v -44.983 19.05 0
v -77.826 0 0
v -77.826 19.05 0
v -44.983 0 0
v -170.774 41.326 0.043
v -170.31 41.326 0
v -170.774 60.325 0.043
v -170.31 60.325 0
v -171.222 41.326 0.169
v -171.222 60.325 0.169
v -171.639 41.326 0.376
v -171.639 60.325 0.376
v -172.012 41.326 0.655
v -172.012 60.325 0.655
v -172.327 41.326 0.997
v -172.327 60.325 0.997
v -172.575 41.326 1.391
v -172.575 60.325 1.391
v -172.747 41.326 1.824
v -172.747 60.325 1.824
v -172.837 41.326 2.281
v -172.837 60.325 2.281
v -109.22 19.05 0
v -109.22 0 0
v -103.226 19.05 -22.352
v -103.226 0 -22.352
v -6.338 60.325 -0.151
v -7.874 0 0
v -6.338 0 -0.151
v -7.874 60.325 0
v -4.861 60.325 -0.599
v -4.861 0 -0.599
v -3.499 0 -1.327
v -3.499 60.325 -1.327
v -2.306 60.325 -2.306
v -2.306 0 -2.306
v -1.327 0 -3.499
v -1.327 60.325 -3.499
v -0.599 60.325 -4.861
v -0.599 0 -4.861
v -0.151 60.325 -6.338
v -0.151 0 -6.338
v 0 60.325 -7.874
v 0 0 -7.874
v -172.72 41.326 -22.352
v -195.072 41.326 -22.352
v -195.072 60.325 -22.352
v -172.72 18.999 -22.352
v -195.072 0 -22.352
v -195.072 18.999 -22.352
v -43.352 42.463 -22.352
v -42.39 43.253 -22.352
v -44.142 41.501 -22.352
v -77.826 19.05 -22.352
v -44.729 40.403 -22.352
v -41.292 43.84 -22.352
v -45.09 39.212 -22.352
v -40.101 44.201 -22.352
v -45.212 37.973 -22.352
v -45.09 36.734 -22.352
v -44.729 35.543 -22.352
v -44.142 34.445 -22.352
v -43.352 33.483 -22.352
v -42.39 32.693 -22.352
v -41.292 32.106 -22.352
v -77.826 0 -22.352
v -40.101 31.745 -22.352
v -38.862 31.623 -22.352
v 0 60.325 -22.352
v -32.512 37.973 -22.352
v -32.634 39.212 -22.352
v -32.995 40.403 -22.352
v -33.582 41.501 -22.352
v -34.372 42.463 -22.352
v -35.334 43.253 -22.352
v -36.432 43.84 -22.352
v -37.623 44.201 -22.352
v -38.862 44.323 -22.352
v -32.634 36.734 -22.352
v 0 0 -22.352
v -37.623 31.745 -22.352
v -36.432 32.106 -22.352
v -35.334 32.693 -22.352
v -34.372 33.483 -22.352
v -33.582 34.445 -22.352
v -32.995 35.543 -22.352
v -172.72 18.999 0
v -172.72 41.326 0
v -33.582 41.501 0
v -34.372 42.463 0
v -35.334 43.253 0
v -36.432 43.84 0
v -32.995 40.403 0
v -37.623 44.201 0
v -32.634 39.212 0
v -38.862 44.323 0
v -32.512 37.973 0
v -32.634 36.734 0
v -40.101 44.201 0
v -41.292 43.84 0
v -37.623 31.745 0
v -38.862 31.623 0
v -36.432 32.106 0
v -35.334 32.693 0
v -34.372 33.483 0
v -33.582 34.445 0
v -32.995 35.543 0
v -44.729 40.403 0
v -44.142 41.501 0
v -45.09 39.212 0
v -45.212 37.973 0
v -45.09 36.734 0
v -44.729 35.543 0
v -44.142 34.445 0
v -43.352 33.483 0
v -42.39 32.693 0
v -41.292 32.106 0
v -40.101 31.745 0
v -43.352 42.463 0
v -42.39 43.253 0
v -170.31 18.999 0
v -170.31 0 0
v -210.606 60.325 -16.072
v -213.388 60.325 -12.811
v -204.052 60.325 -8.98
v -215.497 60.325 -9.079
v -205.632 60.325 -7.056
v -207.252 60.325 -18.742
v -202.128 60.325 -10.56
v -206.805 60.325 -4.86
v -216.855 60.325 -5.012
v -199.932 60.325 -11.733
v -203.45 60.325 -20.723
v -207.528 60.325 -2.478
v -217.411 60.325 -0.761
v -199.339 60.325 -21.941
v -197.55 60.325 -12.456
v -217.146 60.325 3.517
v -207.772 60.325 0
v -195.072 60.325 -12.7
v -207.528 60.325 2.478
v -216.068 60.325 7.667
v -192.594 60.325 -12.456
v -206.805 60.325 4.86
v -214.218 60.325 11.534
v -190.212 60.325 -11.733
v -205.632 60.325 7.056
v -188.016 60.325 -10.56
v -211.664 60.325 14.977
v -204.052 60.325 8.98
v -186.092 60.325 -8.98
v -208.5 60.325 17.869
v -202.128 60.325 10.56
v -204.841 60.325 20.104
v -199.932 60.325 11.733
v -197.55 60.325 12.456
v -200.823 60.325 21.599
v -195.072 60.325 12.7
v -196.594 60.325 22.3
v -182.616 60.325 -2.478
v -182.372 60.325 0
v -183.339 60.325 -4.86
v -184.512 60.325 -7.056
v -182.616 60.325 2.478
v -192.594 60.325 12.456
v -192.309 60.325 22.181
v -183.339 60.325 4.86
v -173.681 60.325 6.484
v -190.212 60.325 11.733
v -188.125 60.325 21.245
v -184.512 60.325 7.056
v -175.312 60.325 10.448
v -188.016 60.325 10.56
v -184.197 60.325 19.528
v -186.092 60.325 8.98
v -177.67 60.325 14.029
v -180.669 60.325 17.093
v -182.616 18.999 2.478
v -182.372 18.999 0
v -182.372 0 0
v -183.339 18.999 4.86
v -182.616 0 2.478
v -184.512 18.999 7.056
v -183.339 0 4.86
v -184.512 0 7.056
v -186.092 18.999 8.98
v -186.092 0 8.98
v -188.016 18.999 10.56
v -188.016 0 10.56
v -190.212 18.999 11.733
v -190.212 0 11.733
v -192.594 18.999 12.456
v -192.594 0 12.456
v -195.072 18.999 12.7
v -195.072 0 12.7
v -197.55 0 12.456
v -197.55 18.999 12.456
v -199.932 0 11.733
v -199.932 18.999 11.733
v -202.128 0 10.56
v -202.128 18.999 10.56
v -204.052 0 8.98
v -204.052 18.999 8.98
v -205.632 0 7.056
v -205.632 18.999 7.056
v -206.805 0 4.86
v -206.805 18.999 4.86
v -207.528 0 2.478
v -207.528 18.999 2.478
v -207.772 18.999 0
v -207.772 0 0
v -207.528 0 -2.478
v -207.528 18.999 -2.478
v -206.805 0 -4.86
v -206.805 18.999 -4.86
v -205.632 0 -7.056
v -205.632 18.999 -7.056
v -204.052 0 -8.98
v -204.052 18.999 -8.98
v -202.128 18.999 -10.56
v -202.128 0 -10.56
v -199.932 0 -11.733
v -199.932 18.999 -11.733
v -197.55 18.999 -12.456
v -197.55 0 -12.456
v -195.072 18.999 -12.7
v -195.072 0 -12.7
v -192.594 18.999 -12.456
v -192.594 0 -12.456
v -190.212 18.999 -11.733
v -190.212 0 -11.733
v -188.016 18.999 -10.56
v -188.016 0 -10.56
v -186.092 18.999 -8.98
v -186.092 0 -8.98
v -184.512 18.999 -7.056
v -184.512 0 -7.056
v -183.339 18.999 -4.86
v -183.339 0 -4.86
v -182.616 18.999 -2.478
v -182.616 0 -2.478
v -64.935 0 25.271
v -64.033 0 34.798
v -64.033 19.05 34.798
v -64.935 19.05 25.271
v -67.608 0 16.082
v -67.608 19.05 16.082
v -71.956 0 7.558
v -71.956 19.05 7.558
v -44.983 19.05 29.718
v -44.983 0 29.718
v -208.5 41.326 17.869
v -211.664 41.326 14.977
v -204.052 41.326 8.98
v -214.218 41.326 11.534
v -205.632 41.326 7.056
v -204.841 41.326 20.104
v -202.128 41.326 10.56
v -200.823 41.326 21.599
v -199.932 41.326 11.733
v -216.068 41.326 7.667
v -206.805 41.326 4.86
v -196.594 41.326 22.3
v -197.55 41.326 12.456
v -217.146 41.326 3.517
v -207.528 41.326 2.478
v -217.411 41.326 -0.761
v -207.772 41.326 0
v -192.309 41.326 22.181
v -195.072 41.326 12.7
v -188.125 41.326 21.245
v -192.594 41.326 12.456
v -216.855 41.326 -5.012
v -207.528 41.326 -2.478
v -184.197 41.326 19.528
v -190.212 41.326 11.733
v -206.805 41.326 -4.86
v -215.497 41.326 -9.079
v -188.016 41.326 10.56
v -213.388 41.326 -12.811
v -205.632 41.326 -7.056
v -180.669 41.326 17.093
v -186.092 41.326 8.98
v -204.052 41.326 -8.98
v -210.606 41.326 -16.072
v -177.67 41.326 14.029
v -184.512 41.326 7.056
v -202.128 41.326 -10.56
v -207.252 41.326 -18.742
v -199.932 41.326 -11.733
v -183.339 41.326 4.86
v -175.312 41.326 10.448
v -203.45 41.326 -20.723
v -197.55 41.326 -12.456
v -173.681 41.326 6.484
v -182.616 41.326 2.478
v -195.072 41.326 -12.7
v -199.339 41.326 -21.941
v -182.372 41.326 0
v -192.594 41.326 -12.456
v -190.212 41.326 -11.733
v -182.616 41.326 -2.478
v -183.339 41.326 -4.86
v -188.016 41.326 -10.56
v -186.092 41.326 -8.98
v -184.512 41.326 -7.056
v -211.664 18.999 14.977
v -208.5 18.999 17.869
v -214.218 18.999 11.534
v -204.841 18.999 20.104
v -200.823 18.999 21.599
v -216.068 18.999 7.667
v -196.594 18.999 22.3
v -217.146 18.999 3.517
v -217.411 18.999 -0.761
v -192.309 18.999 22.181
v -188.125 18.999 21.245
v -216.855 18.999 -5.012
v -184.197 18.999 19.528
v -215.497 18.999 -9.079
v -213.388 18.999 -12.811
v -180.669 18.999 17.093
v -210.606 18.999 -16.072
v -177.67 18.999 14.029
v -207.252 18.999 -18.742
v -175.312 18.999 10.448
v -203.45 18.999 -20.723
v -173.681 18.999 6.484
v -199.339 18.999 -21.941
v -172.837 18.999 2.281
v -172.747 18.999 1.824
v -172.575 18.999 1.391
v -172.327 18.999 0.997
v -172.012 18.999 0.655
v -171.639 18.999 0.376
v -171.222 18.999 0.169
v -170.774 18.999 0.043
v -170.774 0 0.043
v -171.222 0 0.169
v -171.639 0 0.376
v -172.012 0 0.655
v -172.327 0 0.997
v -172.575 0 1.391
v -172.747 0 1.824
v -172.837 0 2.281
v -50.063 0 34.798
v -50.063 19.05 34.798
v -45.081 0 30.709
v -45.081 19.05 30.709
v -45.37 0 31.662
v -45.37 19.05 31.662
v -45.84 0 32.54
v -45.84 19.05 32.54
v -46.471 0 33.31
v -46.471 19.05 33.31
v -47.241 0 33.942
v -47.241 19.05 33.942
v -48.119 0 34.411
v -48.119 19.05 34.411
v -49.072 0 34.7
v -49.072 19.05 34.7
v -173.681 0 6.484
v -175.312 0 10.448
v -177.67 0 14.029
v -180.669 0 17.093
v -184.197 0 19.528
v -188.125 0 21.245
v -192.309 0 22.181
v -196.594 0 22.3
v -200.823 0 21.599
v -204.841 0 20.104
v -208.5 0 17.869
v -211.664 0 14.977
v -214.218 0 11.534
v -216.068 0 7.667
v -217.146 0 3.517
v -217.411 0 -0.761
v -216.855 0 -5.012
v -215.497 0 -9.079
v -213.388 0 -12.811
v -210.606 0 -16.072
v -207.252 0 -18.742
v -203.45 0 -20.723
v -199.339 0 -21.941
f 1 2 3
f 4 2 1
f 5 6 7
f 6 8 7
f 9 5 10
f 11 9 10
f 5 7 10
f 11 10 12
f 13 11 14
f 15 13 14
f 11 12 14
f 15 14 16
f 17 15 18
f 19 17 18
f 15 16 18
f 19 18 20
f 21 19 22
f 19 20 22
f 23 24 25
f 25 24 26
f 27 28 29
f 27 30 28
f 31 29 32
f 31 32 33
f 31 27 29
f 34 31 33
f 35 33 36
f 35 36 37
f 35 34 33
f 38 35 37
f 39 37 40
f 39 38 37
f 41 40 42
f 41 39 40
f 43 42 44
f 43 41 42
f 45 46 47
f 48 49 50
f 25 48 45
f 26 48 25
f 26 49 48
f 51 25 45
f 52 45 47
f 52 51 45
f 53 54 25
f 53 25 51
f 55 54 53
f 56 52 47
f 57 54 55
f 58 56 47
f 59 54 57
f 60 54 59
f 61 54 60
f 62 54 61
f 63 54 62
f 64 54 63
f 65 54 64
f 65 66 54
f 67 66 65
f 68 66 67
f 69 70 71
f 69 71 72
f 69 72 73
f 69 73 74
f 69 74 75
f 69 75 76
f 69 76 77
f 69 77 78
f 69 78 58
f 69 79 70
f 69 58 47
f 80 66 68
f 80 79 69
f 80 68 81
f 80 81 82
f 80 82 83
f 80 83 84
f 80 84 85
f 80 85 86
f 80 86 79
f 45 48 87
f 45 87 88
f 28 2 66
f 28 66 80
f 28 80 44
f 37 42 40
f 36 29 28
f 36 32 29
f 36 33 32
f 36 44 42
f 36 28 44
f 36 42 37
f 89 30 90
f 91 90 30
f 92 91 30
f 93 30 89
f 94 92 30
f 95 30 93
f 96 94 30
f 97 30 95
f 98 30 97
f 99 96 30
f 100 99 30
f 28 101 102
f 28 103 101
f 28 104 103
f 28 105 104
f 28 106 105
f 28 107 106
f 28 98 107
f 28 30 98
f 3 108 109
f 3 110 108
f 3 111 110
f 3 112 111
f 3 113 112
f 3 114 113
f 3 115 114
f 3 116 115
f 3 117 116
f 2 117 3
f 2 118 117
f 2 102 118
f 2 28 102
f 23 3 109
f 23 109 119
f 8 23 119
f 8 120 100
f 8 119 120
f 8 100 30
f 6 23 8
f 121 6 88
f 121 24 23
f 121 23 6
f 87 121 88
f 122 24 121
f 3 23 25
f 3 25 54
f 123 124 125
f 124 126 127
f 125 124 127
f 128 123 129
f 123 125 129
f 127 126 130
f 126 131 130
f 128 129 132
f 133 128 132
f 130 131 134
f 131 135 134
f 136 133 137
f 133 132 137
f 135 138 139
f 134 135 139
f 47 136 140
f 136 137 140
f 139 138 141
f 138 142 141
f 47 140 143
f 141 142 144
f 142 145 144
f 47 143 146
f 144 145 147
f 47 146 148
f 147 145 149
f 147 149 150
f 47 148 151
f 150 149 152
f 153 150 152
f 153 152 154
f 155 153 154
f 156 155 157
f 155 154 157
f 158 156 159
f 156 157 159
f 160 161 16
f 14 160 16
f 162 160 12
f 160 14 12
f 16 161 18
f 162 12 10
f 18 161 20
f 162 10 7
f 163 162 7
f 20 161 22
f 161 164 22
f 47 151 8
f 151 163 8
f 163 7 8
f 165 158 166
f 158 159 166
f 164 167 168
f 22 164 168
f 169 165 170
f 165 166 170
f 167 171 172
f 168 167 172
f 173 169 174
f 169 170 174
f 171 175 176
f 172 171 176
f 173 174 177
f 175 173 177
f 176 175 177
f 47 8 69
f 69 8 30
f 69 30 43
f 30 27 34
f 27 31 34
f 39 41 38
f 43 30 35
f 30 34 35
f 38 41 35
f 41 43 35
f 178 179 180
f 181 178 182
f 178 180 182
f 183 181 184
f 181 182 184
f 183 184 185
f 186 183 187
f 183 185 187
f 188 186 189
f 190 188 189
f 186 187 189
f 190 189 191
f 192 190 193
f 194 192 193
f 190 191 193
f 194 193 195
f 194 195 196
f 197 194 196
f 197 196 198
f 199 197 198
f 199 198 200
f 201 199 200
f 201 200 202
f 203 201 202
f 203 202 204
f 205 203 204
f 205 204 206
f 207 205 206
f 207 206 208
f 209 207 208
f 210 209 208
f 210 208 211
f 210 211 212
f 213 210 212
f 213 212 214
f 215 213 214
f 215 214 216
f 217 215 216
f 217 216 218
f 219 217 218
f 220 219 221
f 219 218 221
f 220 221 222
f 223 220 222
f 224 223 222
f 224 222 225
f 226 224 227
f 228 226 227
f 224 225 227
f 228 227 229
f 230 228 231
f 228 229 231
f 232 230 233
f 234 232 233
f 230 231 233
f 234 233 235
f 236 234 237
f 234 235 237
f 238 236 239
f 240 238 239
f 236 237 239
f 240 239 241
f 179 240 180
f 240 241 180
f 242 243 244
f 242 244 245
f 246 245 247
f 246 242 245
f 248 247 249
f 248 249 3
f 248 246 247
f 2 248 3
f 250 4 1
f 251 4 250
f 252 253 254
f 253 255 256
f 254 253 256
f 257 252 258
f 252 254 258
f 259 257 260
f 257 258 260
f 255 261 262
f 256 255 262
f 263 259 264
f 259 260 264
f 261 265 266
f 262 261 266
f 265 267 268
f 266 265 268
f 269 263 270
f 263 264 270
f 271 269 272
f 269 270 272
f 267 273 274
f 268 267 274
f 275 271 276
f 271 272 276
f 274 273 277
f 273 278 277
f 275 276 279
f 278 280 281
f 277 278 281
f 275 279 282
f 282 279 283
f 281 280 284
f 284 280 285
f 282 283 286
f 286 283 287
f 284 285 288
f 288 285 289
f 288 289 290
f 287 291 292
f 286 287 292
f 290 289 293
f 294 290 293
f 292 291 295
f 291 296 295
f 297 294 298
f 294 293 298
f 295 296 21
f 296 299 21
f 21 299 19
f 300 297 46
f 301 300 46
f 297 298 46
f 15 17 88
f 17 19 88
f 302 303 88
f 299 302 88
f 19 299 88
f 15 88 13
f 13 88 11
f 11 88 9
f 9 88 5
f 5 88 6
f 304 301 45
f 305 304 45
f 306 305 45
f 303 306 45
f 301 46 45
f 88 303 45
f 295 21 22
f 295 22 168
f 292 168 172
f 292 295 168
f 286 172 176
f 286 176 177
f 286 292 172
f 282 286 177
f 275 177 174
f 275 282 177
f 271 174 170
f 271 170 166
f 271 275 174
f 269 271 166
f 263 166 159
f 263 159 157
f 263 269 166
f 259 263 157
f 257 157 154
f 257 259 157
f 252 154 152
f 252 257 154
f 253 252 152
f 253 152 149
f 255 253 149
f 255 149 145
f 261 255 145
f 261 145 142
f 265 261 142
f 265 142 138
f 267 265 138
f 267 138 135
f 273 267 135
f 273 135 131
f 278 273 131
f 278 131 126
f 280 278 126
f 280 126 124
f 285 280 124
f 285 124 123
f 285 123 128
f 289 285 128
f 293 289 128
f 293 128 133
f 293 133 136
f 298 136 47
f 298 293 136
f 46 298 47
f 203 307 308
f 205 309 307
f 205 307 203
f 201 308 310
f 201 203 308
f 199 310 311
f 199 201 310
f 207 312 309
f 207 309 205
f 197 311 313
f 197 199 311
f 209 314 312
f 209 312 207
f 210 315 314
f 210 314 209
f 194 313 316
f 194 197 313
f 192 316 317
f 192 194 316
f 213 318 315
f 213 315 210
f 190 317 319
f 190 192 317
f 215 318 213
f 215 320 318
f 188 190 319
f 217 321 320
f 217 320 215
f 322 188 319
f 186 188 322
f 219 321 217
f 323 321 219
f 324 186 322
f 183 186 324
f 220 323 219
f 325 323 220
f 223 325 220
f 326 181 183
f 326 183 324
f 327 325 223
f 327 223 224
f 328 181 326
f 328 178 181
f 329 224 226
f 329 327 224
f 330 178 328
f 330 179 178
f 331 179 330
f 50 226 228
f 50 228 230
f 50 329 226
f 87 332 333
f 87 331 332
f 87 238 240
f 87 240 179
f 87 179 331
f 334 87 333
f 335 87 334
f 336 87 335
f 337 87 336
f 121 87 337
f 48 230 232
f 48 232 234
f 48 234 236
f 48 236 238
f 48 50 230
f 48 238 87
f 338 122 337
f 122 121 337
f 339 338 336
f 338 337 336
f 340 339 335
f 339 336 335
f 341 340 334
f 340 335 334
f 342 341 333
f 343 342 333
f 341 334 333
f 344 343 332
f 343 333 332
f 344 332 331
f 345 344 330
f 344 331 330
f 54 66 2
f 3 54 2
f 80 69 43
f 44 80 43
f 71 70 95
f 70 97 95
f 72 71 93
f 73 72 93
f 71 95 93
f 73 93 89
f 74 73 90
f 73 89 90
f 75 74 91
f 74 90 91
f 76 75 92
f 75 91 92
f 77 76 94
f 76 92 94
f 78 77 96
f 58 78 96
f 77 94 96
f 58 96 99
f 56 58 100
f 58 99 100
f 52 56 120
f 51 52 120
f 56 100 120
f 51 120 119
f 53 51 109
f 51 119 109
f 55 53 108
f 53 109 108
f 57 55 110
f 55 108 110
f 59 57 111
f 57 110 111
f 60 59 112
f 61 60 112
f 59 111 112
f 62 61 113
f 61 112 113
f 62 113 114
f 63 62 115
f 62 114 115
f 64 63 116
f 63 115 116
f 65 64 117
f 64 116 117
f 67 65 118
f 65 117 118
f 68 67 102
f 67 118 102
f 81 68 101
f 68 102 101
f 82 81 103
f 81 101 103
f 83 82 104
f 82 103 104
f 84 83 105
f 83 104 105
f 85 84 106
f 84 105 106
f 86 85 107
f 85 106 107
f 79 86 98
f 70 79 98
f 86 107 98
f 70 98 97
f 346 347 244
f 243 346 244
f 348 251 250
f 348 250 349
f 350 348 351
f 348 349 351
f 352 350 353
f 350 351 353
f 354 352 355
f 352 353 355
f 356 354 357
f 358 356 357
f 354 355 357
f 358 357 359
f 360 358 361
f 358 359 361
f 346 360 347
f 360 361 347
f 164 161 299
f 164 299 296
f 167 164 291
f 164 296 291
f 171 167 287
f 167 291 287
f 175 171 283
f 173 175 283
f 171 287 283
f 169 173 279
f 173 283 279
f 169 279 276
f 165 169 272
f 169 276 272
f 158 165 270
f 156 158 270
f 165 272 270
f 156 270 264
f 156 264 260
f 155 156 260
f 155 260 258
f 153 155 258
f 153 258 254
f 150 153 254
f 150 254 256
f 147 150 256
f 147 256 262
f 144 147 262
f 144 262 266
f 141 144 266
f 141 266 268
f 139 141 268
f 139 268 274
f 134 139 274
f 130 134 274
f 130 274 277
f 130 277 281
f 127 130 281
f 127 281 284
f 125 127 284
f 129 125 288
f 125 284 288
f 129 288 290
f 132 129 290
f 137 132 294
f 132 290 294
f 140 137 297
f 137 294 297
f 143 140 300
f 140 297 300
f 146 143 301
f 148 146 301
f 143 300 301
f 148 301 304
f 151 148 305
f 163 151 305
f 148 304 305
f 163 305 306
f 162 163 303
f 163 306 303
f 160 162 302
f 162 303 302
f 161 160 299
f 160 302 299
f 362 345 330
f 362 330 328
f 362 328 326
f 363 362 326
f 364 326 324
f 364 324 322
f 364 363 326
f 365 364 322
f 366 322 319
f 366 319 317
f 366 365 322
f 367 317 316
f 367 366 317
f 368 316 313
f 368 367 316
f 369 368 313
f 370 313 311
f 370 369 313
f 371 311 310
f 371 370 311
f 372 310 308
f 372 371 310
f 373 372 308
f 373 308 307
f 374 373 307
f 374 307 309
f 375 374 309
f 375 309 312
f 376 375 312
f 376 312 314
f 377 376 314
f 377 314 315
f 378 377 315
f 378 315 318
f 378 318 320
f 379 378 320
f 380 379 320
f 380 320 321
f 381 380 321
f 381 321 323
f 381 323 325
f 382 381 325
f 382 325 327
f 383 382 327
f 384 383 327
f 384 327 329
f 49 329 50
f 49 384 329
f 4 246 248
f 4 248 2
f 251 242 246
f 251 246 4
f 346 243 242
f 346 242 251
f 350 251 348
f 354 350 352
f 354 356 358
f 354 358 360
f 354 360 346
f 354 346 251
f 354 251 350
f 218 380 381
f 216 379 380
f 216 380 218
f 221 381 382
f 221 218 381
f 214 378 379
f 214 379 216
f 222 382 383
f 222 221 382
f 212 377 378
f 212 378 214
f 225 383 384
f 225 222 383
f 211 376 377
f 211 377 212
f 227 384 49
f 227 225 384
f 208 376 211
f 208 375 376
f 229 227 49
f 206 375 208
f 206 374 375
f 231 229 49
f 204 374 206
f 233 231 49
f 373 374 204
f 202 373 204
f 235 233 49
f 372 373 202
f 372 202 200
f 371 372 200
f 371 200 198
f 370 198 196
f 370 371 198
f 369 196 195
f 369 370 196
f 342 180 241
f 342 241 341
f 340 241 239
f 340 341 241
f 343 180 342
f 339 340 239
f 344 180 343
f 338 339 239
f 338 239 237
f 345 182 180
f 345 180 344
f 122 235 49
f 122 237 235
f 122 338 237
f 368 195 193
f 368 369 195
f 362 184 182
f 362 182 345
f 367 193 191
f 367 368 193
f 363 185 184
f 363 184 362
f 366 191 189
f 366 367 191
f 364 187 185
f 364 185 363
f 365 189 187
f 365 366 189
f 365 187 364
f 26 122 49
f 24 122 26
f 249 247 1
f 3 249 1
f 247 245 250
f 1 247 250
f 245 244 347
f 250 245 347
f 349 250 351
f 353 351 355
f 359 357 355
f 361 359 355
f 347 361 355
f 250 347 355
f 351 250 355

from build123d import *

# Parameters (mm, degrees)
F0_R     = 12.7
F1_DEPTH = 60.325
F2_DEPTH = 19.05
F4_DEPTH = 19.05
F5_W     = 85.049899257
F5_H     = 22.3266
F5_R     = 6.35
F6_DEPTH = 29.464
F7_R     = 7.874
F8_R     = 5.08
F9_R     = 2.54


with BuildPart() as f1:
    # F0 (on Front) → F1 (new body)
    with BuildSketch(Plane.XZ):
        with BuildLine():
            Line((-77.8256, 0), (-172.72, 0))
            ThreePointArc((-172.72, 0), (-210.8772507731, 15.8052507731), (-195.072, -22.352))
            Line((-195.072, -22.352), (0, -22.352))
            Line((0, -22.352), (0, 0))
            Line((0, 0), (-44.9834, 0))
            Line((-44.9834, 0), (-77.8256, 0))
        make_face()
        with Locations((-195.072, 0)):
            Circle(F0_R, mode=Mode.SUBTRACT)
    extrude(amount=-F1_DEPTH)

    # F3 (on face) → F4 (cut)
    with BuildSketch(Plane.XZ):
        Polygon((-77.8256, -22.352), (-77.8256, 0), (-109.22, 0), (-103.2256, -22.352), align=None)
    extrude(amount=-F4_DEPTH, mode=Mode.SUBTRACT)

    # F5 (on face) → F6 (cut, symmetric)
    with BuildSketch(Plane.XY):
        with Locations((-215.2449496285, 30.1625)):
            Rectangle(F5_W, F5_H)
        with Locations((-38.862, 37.973)):
            Circle(F5_R)
    extrude(amount=F6_DEPTH, both=True, mode=Mode.SUBTRACT)

    # F7
    f7_edges = [f1.edges().sort_by_distance(p)[0] for p in [
        (0, 30.1625, 0),
    ]]
    fillet(f7_edges, radius=F7_R)

    # F9
    f9_edges = [f1.edges().sort_by_distance(p)[0] for p in [
        (-172.72, 50.8254, 0),
        (-172.72, 9.4996, 0),
    ]]
    fillet(f9_edges, radius=F9_R)


with BuildPart() as f2:
    # F0 (on Front) → F2 (new body)
    with BuildSketch(Plane.XZ):
        with BuildLine():
            ThreePointArc((-64.0334, 34.798), (-67.6075846384, 16.0823576341), (-77.8256, 0))
            Line((-77.8256, 0), (-44.9834, 0))
            Line((-44.9834, 0), (-44.9834, 34.798))
            Line((-44.9834, 34.798), (-64.0334, 34.798))
        make_face()
    extrude(amount=-F2_DEPTH)

    # F8
    f8_edges = [f2.edges().sort_by_distance(p)[0] for p in [
        (-44.9834, 9.525, 34.798),
    ]]
    fillet(f8_edges, radius=F8_R)


solid = Compound([f1.part, f2.part])
